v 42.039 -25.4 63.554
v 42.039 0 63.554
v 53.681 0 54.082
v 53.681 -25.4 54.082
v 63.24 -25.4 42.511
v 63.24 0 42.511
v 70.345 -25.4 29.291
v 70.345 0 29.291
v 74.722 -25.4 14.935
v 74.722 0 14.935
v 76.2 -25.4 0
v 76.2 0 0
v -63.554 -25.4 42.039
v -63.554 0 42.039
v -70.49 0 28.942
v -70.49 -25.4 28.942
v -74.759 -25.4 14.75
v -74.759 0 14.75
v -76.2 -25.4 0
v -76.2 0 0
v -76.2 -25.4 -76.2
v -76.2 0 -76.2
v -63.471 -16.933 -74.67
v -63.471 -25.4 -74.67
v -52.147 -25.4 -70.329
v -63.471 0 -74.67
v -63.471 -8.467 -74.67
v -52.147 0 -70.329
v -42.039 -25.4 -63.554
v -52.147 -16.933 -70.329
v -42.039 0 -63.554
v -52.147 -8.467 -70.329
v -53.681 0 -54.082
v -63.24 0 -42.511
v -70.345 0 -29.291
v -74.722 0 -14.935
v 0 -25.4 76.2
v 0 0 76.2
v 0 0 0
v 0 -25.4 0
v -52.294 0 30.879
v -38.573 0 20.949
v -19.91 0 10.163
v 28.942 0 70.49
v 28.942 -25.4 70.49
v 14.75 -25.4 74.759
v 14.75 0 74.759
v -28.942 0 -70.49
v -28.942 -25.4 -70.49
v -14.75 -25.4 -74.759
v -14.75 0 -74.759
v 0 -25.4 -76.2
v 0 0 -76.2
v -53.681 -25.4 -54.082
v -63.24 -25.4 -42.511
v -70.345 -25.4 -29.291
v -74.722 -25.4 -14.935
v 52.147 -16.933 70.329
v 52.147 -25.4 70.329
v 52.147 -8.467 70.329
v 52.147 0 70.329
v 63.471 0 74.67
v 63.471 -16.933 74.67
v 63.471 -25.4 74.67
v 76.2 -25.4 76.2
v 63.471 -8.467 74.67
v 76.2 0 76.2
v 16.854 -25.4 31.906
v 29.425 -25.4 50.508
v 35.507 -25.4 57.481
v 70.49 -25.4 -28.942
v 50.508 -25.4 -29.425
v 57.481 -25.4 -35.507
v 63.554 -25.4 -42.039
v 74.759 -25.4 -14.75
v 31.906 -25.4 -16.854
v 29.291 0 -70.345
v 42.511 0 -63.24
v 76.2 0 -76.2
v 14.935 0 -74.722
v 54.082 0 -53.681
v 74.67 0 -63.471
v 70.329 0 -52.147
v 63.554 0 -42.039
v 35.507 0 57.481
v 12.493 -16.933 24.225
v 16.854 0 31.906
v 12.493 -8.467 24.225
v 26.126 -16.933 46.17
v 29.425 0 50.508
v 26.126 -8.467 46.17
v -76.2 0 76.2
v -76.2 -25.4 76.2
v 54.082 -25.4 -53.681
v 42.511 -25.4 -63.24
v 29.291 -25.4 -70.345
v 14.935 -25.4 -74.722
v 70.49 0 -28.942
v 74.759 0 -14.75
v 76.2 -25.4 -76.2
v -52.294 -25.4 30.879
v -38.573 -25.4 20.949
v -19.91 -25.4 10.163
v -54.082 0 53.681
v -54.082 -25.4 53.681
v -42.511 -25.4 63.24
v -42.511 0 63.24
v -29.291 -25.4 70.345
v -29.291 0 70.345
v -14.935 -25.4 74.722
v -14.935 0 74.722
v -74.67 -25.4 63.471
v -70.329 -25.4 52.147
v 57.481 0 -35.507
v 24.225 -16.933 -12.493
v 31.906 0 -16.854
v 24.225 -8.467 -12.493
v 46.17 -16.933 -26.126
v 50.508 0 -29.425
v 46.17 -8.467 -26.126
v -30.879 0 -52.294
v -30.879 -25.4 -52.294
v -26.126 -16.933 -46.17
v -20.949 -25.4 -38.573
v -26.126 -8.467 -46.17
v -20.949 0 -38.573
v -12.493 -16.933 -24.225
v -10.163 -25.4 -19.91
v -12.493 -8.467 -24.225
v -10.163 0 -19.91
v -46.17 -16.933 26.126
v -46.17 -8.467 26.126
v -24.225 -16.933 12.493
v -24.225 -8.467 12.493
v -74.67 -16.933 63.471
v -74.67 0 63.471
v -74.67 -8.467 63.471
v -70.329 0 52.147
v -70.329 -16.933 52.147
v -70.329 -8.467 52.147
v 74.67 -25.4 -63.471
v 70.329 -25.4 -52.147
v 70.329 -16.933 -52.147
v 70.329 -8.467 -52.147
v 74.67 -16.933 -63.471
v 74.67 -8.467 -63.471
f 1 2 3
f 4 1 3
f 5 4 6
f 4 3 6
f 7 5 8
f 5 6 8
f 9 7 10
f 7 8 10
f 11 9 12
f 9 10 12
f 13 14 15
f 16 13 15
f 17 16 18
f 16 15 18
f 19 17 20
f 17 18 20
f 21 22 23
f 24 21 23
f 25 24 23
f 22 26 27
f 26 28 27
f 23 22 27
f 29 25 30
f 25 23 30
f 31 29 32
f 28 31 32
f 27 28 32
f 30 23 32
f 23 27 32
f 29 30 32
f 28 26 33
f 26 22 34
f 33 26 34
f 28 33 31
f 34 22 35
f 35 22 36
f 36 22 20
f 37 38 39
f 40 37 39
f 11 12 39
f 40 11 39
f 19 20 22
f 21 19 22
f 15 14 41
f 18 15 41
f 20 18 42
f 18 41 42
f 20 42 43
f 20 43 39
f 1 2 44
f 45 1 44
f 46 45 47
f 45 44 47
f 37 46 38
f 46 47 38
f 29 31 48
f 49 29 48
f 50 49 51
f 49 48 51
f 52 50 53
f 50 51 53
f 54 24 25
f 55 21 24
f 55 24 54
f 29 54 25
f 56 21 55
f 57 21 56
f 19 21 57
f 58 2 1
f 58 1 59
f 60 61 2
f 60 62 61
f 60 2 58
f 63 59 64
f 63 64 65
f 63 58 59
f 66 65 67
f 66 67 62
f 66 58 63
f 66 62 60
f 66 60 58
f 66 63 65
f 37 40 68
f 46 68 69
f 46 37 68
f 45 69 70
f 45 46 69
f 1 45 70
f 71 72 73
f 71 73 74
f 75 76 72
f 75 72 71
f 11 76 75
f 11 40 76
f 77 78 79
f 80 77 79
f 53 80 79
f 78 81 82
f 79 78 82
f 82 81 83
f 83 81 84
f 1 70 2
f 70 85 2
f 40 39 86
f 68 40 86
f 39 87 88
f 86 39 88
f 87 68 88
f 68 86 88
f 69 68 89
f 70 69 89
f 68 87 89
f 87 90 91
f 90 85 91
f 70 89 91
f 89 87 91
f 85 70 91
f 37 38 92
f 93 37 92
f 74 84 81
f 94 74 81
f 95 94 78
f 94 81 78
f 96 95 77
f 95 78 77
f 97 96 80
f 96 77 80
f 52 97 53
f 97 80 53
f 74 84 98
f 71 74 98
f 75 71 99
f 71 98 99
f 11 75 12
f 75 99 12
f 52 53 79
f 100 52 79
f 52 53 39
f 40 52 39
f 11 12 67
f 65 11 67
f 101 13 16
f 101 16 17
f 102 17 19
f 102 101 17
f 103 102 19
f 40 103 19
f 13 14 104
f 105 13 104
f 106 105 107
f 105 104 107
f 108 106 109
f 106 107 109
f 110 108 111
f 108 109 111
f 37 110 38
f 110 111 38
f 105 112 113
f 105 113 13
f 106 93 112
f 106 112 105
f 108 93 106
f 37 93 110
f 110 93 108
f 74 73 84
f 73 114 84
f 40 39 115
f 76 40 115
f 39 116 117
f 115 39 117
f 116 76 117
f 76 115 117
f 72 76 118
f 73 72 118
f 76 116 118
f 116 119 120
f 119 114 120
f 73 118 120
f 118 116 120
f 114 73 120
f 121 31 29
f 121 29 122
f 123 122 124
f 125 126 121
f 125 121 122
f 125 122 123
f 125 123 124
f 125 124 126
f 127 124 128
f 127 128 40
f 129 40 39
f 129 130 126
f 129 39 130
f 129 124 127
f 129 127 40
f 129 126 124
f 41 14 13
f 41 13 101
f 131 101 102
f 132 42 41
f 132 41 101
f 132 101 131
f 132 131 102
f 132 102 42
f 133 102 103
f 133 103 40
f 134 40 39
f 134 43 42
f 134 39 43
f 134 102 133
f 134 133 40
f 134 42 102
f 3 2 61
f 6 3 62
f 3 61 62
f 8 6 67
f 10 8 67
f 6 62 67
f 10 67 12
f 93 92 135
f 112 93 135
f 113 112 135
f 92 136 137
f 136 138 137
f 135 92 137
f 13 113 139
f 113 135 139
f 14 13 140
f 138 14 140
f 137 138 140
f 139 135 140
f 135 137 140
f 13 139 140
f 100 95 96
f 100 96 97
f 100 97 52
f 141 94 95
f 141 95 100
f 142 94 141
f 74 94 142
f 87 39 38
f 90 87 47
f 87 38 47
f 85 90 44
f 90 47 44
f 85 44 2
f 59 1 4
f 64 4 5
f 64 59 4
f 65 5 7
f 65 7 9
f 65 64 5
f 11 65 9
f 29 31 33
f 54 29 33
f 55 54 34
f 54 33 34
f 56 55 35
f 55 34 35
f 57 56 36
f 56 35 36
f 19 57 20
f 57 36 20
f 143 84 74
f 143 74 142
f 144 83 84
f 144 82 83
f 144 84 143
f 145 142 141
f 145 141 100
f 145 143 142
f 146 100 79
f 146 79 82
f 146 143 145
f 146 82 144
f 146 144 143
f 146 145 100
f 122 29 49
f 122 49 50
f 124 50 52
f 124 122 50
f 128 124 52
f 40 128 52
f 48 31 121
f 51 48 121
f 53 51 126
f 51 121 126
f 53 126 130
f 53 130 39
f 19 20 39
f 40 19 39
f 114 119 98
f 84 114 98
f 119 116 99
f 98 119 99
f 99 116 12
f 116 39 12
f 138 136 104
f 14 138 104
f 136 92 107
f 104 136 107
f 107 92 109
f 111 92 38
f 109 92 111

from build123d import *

# Parameters (mm, degrees)
F1_DEPTH = 25.4


with BuildPart() as f1:
    # F0 (on Front) → F1 (new body)
    with BuildSketch(Plane.XZ):
        with BuildLine():
            ThreePointArc((63.5541387067, -42.0394035787), (36.0765675148, -67.1187103299), (0, -76.2))
            Line((0, -76.2), (76.2, -76.2))
            add(Edge.make_bspline(
                [(63.5541387067, -42.0394035787), (71.4204258855, -51.6007690119), (76.2, -62.7054909773), (76.2, -76.2)],
                knots=[177.3579115508, 177.3579115508, 177.3579115508, 177.3579115508, 215.5261469057, 215.5261469057, 215.5261469057, 215.5261469057], degree=3))
        make_face()
    extrude(amount=F1_DEPTH)


with BuildPart() as f1b:
    # F0 (on Front) → F1, piece 2 (new body)
    with BuildSketch(Plane.XZ):
        with BuildLine():
            Line((0, 76.2), (-76.2, 76.2))
            add(Edge.make_bspline(
                [(-76.2, 76.2), (-76.2, 62.7054909773), (-71.4204258855, 51.6007690119), (-63.5541387067, 42.0394035787)],
                knots=[0, 0, 0, 0, 38.1682353548, 38.1682353548, 38.1682353548, 38.1682353548], degree=3))
            ThreePointArc((-63.5541387067, 42.0394035787), (-36.0765675148, 67.1187103299), (0, 76.2))
        make_face()
    extrude(amount=F1_DEPTH)


with BuildPart() as f1c:
    # F0 (on Front) → F1, piece 3 (new body)
    with BuildSketch(Plane.XZ):
        with BuildLine():
            Line((-76.2, 0), (-76.2, -76.2))
            add(Edge.make_bspline(
                [(-76.2, -76.2), (-62.7054909773, -76.2), (-51.6007690119, -71.4204258855), (-42.0394035787, -63.5541387067)],
                knots=[0, 0, 0, 0, 38.1682353548, 38.1682353548, 38.1682353548, 38.1682353548], degree=3))
            ThreePointArc((-42.0394035787, -63.5541387067), (-67.1187103299, -36.0765675148), (-76.2, 0))
        make_face()
    extrude(amount=F1_DEPTH)


with BuildPart() as f1d:
    # F0 (on Front) → F1, piece 4 (new body)
    with BuildSketch(Plane.XZ):
        with BuildLine():
            ThreePointArc((42.0394035787, 63.5541387067), (67.1187103299, 36.0765675148), (76.2, 0))
            Line((76.2, 0), (76.2, 76.2))
            add(Edge.make_bspline(
                [(42.0394035787, 63.5541387067), (51.6007690119, 71.4204258855), (62.7054909773, 76.2), (76.2, 76.2)],
                knots=[177.3579115508, 177.3579115508, 177.3579115508, 177.3579115508, 215.5261469057, 215.5261469057, 215.5261469057, 215.5261469057], degree=3))
        make_face()
    extrude(amount=F1_DEPTH)


with BuildPart() as f1e:
    # F0 (on Front) → F1, piece 5 (new body)
    with BuildSketch(Plane.XZ):
        with BuildLine():
            ThreePointArc((-42.0394035787, -63.5541387067), (-21.9501096871, -72.9700807504), (0, -76.2))
            Line((0, -76.2), (0, 0))
            add(Edge.make_bspline(
                [(-42.0394035787, -63.5541387067), (-24.6054909773, -49.2109819547), (-12.3027454887, -24.6054909773), (0, 0)],
                knots=[38.1682353548, 38.1682353548, 38.1682353548, 38.1682353548, 107.7630734528, 107.7630734528, 107.7630734528, 107.7630734528], degree=3))
        make_face()
    extrude(amount=F1_DEPTH)


with BuildPart() as f1f:
    # F0 (on Front) → F1, piece 6 (new body)
    with BuildSketch(Plane.XZ):
        with BuildLine():
            Line((0, 76.2), (0, 0))
            add(Edge.make_bspline(
                [(0, 0), (12.3027454887, 24.6054909773), (24.6054909773, 49.2109819547), (42.0394035787, 63.5541387067)],
                knots=[107.7630734528, 107.7630734528, 107.7630734528, 107.7630734528, 177.3579115508, 177.3579115508, 177.3579115508, 177.3579115508], degree=3))
            ThreePointArc((42.0394035787, 63.5541387067), (21.9501096871, 72.9700807504), (0, 76.2))
        make_face()
    extrude(amount=F1_DEPTH)


with BuildPart() as f1g:
    # F0 (on Front) → F1, piece 7 (new body)
    with BuildSketch(Plane.XZ):
        with BuildLine():
            ThreePointArc((-63.5541387067, 42.0394035787), (-72.9700807504, 21.9501096871), (-76.2, 0))
            Line((-76.2, 0), (0, 0))
            add(Edge.make_bspline(
                [(-63.5541387067, 42.0394035787), (-49.2109819547, 24.6054909773), (-24.6054909773, 12.3027454887), (0, 0)],
                knots=[38.1682353548, 38.1682353548, 38.1682353548, 38.1682353548, 107.7630734528, 107.7630734528, 107.7630734528, 107.7630734528], degree=3))
        make_face()
    extrude(amount=F1_DEPTH)


with BuildPart() as f1h:
    # F0 (on Front) → F1, piece 8 (new body)
    with BuildSketch(Plane.XZ):
        with BuildLine():
            add(Edge.make_bspline(
                [(0, 0), (24.6054909773, -12.3027454887), (49.2109819547, -24.6054909773), (63.5541387067, -42.0394035787)],
                knots=[107.7630734528, 107.7630734528, 107.7630734528, 107.7630734528, 177.3579115508, 177.3579115508, 177.3579115508, 177.3579115508], degree=3))
            ThreePointArc((63.5541387067, -42.0394035787), (72.9700807504, -21.9501096871), (76.2, 0))
            Line((76.2, 0), (0, 0))
        make_face()
    extrude(amount=F1_DEPTH)


solid = Compound([f1.part, f1b.part, f1c.part, f1d.part, f1e.part, f1f.part, f1g.part, f1h.part])
